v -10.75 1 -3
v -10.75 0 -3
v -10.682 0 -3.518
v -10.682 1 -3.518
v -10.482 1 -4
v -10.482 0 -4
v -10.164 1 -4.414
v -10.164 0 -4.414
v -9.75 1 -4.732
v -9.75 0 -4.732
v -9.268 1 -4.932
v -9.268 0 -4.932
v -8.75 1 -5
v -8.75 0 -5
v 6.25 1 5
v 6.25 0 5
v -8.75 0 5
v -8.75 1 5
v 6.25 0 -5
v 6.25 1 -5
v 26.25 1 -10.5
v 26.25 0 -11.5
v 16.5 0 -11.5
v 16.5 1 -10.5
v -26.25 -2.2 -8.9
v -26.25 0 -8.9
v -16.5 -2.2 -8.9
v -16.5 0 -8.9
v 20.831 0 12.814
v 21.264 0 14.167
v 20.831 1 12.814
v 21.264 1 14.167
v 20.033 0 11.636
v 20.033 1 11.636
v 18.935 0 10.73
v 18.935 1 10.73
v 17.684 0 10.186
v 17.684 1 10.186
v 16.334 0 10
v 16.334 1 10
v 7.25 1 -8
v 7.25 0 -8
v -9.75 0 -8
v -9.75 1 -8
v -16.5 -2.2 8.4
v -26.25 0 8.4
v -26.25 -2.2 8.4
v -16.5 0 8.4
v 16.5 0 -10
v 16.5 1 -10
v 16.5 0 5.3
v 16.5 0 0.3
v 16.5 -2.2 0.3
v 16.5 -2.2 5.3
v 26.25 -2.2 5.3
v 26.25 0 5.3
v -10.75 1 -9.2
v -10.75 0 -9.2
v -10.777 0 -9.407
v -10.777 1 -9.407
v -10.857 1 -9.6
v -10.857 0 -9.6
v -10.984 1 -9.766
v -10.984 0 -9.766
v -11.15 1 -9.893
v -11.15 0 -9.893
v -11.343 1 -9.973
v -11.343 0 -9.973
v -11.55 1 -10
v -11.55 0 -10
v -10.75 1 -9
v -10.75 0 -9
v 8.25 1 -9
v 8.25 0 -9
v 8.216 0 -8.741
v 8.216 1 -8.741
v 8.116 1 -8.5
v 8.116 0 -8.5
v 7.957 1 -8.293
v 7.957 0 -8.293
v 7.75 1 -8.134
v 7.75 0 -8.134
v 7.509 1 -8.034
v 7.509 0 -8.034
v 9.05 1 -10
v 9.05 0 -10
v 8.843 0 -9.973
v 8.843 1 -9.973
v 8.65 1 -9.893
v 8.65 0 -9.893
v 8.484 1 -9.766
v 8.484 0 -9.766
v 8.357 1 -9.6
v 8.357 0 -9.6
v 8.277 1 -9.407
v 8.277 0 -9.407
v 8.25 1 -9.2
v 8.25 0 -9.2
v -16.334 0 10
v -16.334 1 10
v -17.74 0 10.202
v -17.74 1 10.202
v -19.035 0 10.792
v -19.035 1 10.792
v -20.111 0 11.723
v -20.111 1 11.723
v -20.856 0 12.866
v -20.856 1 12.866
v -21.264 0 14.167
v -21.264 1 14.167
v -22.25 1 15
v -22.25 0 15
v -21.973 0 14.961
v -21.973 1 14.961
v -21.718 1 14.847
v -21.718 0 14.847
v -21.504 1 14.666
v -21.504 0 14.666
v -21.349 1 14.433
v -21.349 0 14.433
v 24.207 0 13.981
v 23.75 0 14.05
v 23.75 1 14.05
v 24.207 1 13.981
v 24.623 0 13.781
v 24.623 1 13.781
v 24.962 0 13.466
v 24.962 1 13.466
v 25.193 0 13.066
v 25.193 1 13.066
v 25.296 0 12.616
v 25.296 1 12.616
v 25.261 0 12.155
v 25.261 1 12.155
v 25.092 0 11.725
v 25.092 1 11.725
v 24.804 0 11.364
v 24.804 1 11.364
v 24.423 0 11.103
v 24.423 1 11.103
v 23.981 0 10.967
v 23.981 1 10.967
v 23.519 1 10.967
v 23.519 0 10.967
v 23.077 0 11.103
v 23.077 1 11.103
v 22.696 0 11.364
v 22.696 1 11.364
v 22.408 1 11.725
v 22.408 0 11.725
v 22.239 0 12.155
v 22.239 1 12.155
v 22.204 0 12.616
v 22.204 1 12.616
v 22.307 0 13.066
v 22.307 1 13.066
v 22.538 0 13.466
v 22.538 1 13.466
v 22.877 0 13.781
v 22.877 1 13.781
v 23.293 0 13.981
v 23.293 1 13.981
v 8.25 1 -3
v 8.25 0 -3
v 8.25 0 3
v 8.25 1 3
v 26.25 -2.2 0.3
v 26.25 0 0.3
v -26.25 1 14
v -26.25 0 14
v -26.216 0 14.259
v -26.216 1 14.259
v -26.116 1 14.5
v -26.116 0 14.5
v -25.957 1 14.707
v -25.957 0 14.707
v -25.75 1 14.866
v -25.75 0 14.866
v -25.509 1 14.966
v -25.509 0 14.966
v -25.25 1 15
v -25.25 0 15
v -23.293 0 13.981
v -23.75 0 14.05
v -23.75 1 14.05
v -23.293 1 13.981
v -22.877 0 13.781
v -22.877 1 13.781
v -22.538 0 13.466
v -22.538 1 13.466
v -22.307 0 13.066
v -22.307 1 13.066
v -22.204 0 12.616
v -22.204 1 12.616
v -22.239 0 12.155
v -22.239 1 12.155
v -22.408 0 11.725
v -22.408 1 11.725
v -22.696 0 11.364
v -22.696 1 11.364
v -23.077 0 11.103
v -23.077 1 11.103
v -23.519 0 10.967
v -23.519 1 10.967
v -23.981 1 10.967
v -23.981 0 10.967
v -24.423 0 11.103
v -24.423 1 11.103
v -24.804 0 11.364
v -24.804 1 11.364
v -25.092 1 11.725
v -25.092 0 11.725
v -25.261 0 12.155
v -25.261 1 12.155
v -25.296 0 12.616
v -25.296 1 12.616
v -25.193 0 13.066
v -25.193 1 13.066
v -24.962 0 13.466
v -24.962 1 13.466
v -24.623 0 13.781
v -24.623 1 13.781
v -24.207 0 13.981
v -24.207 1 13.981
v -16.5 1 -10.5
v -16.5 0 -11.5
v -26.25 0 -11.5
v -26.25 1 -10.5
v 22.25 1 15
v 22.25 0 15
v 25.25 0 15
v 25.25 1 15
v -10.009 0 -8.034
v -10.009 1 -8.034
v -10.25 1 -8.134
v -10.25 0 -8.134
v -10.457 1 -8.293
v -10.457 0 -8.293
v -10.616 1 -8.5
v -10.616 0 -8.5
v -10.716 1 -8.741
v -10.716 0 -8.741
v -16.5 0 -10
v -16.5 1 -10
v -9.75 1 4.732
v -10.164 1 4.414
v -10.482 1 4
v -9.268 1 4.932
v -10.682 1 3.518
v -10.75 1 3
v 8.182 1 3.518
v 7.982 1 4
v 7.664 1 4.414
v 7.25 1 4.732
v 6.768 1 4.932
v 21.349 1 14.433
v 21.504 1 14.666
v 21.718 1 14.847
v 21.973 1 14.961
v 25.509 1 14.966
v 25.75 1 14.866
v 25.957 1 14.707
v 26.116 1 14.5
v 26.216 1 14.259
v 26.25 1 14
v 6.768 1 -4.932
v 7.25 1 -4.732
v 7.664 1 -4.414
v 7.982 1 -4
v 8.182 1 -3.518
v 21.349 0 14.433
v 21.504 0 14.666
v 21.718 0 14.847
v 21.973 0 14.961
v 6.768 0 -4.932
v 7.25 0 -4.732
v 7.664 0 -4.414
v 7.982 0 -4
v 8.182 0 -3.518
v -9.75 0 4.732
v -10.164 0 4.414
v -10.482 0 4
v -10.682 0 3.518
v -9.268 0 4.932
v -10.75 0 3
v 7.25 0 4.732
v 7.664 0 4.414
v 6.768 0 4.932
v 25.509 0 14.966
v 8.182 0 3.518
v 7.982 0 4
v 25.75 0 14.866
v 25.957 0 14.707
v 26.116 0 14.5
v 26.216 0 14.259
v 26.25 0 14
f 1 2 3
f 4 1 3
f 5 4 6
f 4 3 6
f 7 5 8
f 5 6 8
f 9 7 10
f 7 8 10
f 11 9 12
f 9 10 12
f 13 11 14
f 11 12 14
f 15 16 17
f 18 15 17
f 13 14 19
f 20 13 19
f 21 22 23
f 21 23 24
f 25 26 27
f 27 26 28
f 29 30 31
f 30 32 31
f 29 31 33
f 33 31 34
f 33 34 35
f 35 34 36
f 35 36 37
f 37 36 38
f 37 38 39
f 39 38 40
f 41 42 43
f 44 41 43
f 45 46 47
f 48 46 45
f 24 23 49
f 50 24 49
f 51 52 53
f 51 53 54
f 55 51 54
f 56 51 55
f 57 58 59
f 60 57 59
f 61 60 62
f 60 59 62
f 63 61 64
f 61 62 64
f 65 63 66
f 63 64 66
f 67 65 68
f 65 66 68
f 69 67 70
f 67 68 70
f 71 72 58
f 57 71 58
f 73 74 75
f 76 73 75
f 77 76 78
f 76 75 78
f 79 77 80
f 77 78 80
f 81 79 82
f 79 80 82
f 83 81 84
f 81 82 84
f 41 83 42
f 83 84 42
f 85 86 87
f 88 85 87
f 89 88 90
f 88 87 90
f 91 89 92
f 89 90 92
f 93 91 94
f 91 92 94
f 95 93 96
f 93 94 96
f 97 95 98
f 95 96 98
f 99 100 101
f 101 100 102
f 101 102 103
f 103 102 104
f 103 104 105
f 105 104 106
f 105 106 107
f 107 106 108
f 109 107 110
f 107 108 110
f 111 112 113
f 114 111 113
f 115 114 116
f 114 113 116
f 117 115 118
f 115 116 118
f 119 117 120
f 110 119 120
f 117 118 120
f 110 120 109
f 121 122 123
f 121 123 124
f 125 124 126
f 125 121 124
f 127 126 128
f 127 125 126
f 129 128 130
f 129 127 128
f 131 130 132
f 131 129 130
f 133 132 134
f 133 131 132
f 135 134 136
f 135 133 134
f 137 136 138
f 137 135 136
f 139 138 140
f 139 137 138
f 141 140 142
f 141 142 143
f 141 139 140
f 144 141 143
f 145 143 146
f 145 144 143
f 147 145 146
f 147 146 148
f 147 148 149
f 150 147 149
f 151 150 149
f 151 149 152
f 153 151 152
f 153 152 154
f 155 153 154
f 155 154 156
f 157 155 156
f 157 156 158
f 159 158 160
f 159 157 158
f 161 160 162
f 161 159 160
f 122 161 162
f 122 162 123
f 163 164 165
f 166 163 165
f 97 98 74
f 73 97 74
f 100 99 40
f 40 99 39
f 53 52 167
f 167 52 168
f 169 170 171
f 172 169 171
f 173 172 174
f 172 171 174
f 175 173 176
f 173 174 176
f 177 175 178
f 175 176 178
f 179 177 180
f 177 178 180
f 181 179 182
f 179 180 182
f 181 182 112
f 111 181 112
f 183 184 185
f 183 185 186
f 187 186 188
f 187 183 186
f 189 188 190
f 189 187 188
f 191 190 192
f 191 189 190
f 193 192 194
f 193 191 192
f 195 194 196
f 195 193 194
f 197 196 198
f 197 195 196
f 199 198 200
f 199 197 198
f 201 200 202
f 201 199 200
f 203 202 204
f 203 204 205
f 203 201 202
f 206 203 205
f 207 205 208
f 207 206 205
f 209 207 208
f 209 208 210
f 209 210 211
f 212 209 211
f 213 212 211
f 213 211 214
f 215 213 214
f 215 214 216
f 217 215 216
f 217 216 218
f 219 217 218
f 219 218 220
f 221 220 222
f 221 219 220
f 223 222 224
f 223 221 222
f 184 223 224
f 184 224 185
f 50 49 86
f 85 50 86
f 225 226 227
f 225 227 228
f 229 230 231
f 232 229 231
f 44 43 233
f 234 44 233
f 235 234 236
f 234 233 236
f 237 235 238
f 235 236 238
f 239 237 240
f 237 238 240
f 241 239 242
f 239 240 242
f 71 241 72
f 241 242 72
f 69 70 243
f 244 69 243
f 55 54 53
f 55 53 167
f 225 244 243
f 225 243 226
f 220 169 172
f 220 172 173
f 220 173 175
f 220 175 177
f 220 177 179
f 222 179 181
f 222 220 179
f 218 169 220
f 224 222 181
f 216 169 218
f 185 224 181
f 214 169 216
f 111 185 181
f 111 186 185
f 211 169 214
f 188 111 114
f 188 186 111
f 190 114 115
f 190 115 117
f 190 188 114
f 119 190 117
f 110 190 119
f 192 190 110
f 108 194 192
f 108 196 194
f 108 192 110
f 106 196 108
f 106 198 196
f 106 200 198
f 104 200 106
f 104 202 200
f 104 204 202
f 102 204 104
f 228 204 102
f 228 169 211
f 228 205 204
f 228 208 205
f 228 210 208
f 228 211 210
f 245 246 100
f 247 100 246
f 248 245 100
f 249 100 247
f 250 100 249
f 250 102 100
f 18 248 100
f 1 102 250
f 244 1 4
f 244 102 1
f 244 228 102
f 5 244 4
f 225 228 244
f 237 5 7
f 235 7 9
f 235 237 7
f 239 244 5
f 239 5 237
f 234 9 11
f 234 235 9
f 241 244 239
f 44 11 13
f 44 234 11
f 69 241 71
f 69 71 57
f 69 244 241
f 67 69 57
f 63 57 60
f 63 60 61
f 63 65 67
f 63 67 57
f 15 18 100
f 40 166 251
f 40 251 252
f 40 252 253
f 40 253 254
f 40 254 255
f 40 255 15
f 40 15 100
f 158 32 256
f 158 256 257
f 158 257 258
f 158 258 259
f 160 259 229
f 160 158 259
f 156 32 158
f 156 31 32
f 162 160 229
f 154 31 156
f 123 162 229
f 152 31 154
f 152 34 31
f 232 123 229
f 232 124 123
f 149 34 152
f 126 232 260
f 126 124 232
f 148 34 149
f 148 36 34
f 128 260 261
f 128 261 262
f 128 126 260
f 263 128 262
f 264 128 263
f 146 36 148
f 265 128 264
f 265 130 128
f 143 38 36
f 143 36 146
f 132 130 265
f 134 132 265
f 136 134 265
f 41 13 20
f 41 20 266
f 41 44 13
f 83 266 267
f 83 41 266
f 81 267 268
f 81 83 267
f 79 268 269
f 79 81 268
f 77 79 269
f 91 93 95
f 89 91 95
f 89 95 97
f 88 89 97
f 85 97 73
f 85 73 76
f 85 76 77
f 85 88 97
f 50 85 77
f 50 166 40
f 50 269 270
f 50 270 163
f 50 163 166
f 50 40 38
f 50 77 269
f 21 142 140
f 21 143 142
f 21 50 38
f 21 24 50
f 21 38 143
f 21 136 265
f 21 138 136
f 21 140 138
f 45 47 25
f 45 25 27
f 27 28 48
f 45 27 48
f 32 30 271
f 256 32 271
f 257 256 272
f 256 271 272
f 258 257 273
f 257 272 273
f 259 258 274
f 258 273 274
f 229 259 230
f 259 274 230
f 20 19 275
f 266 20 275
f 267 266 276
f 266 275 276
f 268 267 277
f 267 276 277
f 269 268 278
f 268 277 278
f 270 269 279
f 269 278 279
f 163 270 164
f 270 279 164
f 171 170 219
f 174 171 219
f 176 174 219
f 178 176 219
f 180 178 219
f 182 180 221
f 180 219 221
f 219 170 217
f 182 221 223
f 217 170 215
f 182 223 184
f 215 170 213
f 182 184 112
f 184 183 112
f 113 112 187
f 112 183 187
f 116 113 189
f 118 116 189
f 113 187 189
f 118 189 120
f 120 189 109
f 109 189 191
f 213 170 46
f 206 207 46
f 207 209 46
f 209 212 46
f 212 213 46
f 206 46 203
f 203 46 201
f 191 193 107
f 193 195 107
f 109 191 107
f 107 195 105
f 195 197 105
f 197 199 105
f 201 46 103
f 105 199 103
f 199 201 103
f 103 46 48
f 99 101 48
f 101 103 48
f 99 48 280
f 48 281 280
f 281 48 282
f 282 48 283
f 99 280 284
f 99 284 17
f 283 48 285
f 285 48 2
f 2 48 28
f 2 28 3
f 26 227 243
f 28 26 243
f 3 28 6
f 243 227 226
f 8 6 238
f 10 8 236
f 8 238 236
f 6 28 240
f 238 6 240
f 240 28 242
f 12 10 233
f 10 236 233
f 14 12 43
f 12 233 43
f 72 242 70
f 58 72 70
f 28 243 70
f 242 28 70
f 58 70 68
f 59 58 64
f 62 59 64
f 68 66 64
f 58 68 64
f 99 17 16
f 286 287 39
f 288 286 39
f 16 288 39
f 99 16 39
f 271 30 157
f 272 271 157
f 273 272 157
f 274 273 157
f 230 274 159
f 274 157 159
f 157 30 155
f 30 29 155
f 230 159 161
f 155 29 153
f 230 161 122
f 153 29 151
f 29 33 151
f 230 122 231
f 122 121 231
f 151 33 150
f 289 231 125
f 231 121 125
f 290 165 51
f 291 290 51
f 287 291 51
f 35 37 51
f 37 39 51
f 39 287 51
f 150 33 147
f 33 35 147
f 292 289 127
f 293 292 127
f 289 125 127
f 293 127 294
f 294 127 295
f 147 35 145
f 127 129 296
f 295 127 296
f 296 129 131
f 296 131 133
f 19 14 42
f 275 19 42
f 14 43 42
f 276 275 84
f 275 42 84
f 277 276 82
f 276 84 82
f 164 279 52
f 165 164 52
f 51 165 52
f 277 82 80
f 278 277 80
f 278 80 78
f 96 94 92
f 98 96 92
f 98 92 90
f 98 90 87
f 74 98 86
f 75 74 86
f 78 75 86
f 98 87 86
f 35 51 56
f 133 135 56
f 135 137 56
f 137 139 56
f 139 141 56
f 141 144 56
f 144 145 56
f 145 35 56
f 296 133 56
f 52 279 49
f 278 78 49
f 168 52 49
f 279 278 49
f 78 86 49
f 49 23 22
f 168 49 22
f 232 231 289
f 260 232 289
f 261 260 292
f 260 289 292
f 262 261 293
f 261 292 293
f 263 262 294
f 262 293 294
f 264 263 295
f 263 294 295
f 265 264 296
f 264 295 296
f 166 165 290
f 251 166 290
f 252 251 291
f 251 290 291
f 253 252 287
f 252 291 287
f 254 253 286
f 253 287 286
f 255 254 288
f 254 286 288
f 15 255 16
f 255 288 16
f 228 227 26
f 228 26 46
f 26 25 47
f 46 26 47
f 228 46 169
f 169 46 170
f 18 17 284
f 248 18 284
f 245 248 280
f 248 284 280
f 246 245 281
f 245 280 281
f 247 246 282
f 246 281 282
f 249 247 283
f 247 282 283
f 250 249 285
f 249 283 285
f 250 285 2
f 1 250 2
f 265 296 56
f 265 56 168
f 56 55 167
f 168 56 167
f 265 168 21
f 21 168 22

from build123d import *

# Parameters (mm, degrees)
SKETCH1_R           = 1.55
BOSS_EXTRUDE1_DEPTH = 1
CHAMFER1_SIZE       = 1.5
SKETCH5_W           = 9.75
SKETCH5_H           = 17.3
SKETCH5_H_2         = 5
BOSS_EXTRUDE2_DEPTH = 2.2
FILLET2_R           = 5


with BuildPart() as part:
    # Sketch1 → Boss-Extrude1 (new body)
    with BuildSketch(Plane(origin=(0, 0, 0), x_dir=(1, 0, 0), z_dir=(0, 1, 0))):
        with BuildLine():
            Line((-11.55, 10), (-16.5, 10))
            Line((-16.5, 10), (-16.5, 12))
            Line((-16.5, 12), (-26.25, 12))
            Line((-26.25, 12), (-26.25, -14))
            ThreePointArc((-26.25, -14), (-25.957106781, -14.707106781), (-25.25, -15))
            Line((-25.25, -15), (-22.25, -15))
            ThreePointArc((-22.25, -15), (-21.542893219, -14.707106781), (-21.25, -14))
            Line((-21.25, -14), (-21.25, -10))
            Line((-21.25, -10), (21.25, -10))
            Line((21.25, -10), (21.25, -14))
            ThreePointArc((21.25, -14), (21.542893219, -14.707106781), (22.25, -15))
            Line((22.25, -15), (25.25, -15))
            ThreePointArc((25.25, -15), (25.957106781, -14.707106781), (26.25, -14))
            Line((26.25, -14), (26.25, 12))
            Line((26.25, 12), (16.5, 12))
            Line((16.5, 12), (16.5, 10))
            Line((16.5, 10), (9.05, 10))
            ThreePointArc((9.05, 10), (8.484314575, 9.765685425), (8.25, 9.2))
            Line((8.25, 9.2), (8.25, 9))
            ThreePointArc((8.25, 9), (7.957106781, 8.292893219), (7.25, 8))
            Line((7.25, 8), (-9.75, 8))
            ThreePointArc((-9.75, 8), (-10.457106781, 8.292893219), (-10.75, 9))
            Line((-10.75, 9), (-10.75, 9.2))
            ThreePointArc((-10.75, 9.2), (-10.984314575, 9.765685425), (-11.55, 10))
        make_face()
        with BuildLine():
            Line((6.25, -5), (-8.75, -5))
            ThreePointArc((-8.75, -5), (-10.164213562, -4.414213562), (-10.75, -3))
            Line((-10.75, -3), (-10.75, 3))
            ThreePointArc((-10.75, 3), (-10.164213562, 4.414213562), (-8.75, 5))
            Line((-8.75, 5), (6.25, 5))
            ThreePointArc((6.25, 5), (7.664213562, 4.414213562), (8.25, 3))
            Line((8.25, 3), (8.25, -3))
            ThreePointArc((8.25, -3), (7.664213562, -4.414213562), (6.25, -5))
        make_face(mode=Mode.SUBTRACT)
        with Locations(Location((-23.75, -12.5, 0), (0, 0, 270))):
            Circle(SKETCH1_R, mode=Mode.SUBTRACT)
        with Locations(Location((23.75, -12.5, 0), (0, 0, 270))):
            Circle(SKETCH1_R, mode=Mode.SUBTRACT)
    extrude(amount=BOSS_EXTRUDE1_DEPTH)

    # Chamfer1
    # the kernel refuses this chamfer: 1.5 mm, written as the material it takes off along each edge
    with BuildSketch(Plane(origin=(-12.642475518, 1, -12), x_dir=(0, -0.9996219169112968, -0.027495876610586778), z_dir=(-1, 0, 0)), Plane(origin=(30.107524482, 1, -12), x_dir=(0, -0.9996219169112968, -0.027495876610586778), z_dir=(-1, 0, 0))) as chamfer1_piece_1:
        Polygon((CHAMFER1_SIZE * 0.999621916911, CHAMFER1_SIZE * 0.0274958766106), (-CHAMFER1_SIZE * 0.0274958766106, CHAMFER1_SIZE * 0.999621916911), (0, 0), align=None)
    extrude(amount=17.465048964, mode=Mode.SUBTRACT)

    # Sketch5 → Boss-Extrude2 (add)
    with BuildSketch(Plane.XZ):
        with Locations((-21.375, -0.25)):
            Rectangle(SKETCH5_W, SKETCH5_H)
        with Locations((21.375, 2.8)):
            Rectangle(SKETCH5_W, SKETCH5_H_2)
    extrude(amount=BOSS_EXTRUDE2_DEPTH)

    # Fillet2
    fillet2_edges = [part.edges().sort_by_distance(p)[0] for p in [
        (21.25, 0.5, 10),
        (-21.25, 0.5, 10),
    ]]
    fillet(fillet2_edges, radius=FILLET2_R)


solid = part.part
